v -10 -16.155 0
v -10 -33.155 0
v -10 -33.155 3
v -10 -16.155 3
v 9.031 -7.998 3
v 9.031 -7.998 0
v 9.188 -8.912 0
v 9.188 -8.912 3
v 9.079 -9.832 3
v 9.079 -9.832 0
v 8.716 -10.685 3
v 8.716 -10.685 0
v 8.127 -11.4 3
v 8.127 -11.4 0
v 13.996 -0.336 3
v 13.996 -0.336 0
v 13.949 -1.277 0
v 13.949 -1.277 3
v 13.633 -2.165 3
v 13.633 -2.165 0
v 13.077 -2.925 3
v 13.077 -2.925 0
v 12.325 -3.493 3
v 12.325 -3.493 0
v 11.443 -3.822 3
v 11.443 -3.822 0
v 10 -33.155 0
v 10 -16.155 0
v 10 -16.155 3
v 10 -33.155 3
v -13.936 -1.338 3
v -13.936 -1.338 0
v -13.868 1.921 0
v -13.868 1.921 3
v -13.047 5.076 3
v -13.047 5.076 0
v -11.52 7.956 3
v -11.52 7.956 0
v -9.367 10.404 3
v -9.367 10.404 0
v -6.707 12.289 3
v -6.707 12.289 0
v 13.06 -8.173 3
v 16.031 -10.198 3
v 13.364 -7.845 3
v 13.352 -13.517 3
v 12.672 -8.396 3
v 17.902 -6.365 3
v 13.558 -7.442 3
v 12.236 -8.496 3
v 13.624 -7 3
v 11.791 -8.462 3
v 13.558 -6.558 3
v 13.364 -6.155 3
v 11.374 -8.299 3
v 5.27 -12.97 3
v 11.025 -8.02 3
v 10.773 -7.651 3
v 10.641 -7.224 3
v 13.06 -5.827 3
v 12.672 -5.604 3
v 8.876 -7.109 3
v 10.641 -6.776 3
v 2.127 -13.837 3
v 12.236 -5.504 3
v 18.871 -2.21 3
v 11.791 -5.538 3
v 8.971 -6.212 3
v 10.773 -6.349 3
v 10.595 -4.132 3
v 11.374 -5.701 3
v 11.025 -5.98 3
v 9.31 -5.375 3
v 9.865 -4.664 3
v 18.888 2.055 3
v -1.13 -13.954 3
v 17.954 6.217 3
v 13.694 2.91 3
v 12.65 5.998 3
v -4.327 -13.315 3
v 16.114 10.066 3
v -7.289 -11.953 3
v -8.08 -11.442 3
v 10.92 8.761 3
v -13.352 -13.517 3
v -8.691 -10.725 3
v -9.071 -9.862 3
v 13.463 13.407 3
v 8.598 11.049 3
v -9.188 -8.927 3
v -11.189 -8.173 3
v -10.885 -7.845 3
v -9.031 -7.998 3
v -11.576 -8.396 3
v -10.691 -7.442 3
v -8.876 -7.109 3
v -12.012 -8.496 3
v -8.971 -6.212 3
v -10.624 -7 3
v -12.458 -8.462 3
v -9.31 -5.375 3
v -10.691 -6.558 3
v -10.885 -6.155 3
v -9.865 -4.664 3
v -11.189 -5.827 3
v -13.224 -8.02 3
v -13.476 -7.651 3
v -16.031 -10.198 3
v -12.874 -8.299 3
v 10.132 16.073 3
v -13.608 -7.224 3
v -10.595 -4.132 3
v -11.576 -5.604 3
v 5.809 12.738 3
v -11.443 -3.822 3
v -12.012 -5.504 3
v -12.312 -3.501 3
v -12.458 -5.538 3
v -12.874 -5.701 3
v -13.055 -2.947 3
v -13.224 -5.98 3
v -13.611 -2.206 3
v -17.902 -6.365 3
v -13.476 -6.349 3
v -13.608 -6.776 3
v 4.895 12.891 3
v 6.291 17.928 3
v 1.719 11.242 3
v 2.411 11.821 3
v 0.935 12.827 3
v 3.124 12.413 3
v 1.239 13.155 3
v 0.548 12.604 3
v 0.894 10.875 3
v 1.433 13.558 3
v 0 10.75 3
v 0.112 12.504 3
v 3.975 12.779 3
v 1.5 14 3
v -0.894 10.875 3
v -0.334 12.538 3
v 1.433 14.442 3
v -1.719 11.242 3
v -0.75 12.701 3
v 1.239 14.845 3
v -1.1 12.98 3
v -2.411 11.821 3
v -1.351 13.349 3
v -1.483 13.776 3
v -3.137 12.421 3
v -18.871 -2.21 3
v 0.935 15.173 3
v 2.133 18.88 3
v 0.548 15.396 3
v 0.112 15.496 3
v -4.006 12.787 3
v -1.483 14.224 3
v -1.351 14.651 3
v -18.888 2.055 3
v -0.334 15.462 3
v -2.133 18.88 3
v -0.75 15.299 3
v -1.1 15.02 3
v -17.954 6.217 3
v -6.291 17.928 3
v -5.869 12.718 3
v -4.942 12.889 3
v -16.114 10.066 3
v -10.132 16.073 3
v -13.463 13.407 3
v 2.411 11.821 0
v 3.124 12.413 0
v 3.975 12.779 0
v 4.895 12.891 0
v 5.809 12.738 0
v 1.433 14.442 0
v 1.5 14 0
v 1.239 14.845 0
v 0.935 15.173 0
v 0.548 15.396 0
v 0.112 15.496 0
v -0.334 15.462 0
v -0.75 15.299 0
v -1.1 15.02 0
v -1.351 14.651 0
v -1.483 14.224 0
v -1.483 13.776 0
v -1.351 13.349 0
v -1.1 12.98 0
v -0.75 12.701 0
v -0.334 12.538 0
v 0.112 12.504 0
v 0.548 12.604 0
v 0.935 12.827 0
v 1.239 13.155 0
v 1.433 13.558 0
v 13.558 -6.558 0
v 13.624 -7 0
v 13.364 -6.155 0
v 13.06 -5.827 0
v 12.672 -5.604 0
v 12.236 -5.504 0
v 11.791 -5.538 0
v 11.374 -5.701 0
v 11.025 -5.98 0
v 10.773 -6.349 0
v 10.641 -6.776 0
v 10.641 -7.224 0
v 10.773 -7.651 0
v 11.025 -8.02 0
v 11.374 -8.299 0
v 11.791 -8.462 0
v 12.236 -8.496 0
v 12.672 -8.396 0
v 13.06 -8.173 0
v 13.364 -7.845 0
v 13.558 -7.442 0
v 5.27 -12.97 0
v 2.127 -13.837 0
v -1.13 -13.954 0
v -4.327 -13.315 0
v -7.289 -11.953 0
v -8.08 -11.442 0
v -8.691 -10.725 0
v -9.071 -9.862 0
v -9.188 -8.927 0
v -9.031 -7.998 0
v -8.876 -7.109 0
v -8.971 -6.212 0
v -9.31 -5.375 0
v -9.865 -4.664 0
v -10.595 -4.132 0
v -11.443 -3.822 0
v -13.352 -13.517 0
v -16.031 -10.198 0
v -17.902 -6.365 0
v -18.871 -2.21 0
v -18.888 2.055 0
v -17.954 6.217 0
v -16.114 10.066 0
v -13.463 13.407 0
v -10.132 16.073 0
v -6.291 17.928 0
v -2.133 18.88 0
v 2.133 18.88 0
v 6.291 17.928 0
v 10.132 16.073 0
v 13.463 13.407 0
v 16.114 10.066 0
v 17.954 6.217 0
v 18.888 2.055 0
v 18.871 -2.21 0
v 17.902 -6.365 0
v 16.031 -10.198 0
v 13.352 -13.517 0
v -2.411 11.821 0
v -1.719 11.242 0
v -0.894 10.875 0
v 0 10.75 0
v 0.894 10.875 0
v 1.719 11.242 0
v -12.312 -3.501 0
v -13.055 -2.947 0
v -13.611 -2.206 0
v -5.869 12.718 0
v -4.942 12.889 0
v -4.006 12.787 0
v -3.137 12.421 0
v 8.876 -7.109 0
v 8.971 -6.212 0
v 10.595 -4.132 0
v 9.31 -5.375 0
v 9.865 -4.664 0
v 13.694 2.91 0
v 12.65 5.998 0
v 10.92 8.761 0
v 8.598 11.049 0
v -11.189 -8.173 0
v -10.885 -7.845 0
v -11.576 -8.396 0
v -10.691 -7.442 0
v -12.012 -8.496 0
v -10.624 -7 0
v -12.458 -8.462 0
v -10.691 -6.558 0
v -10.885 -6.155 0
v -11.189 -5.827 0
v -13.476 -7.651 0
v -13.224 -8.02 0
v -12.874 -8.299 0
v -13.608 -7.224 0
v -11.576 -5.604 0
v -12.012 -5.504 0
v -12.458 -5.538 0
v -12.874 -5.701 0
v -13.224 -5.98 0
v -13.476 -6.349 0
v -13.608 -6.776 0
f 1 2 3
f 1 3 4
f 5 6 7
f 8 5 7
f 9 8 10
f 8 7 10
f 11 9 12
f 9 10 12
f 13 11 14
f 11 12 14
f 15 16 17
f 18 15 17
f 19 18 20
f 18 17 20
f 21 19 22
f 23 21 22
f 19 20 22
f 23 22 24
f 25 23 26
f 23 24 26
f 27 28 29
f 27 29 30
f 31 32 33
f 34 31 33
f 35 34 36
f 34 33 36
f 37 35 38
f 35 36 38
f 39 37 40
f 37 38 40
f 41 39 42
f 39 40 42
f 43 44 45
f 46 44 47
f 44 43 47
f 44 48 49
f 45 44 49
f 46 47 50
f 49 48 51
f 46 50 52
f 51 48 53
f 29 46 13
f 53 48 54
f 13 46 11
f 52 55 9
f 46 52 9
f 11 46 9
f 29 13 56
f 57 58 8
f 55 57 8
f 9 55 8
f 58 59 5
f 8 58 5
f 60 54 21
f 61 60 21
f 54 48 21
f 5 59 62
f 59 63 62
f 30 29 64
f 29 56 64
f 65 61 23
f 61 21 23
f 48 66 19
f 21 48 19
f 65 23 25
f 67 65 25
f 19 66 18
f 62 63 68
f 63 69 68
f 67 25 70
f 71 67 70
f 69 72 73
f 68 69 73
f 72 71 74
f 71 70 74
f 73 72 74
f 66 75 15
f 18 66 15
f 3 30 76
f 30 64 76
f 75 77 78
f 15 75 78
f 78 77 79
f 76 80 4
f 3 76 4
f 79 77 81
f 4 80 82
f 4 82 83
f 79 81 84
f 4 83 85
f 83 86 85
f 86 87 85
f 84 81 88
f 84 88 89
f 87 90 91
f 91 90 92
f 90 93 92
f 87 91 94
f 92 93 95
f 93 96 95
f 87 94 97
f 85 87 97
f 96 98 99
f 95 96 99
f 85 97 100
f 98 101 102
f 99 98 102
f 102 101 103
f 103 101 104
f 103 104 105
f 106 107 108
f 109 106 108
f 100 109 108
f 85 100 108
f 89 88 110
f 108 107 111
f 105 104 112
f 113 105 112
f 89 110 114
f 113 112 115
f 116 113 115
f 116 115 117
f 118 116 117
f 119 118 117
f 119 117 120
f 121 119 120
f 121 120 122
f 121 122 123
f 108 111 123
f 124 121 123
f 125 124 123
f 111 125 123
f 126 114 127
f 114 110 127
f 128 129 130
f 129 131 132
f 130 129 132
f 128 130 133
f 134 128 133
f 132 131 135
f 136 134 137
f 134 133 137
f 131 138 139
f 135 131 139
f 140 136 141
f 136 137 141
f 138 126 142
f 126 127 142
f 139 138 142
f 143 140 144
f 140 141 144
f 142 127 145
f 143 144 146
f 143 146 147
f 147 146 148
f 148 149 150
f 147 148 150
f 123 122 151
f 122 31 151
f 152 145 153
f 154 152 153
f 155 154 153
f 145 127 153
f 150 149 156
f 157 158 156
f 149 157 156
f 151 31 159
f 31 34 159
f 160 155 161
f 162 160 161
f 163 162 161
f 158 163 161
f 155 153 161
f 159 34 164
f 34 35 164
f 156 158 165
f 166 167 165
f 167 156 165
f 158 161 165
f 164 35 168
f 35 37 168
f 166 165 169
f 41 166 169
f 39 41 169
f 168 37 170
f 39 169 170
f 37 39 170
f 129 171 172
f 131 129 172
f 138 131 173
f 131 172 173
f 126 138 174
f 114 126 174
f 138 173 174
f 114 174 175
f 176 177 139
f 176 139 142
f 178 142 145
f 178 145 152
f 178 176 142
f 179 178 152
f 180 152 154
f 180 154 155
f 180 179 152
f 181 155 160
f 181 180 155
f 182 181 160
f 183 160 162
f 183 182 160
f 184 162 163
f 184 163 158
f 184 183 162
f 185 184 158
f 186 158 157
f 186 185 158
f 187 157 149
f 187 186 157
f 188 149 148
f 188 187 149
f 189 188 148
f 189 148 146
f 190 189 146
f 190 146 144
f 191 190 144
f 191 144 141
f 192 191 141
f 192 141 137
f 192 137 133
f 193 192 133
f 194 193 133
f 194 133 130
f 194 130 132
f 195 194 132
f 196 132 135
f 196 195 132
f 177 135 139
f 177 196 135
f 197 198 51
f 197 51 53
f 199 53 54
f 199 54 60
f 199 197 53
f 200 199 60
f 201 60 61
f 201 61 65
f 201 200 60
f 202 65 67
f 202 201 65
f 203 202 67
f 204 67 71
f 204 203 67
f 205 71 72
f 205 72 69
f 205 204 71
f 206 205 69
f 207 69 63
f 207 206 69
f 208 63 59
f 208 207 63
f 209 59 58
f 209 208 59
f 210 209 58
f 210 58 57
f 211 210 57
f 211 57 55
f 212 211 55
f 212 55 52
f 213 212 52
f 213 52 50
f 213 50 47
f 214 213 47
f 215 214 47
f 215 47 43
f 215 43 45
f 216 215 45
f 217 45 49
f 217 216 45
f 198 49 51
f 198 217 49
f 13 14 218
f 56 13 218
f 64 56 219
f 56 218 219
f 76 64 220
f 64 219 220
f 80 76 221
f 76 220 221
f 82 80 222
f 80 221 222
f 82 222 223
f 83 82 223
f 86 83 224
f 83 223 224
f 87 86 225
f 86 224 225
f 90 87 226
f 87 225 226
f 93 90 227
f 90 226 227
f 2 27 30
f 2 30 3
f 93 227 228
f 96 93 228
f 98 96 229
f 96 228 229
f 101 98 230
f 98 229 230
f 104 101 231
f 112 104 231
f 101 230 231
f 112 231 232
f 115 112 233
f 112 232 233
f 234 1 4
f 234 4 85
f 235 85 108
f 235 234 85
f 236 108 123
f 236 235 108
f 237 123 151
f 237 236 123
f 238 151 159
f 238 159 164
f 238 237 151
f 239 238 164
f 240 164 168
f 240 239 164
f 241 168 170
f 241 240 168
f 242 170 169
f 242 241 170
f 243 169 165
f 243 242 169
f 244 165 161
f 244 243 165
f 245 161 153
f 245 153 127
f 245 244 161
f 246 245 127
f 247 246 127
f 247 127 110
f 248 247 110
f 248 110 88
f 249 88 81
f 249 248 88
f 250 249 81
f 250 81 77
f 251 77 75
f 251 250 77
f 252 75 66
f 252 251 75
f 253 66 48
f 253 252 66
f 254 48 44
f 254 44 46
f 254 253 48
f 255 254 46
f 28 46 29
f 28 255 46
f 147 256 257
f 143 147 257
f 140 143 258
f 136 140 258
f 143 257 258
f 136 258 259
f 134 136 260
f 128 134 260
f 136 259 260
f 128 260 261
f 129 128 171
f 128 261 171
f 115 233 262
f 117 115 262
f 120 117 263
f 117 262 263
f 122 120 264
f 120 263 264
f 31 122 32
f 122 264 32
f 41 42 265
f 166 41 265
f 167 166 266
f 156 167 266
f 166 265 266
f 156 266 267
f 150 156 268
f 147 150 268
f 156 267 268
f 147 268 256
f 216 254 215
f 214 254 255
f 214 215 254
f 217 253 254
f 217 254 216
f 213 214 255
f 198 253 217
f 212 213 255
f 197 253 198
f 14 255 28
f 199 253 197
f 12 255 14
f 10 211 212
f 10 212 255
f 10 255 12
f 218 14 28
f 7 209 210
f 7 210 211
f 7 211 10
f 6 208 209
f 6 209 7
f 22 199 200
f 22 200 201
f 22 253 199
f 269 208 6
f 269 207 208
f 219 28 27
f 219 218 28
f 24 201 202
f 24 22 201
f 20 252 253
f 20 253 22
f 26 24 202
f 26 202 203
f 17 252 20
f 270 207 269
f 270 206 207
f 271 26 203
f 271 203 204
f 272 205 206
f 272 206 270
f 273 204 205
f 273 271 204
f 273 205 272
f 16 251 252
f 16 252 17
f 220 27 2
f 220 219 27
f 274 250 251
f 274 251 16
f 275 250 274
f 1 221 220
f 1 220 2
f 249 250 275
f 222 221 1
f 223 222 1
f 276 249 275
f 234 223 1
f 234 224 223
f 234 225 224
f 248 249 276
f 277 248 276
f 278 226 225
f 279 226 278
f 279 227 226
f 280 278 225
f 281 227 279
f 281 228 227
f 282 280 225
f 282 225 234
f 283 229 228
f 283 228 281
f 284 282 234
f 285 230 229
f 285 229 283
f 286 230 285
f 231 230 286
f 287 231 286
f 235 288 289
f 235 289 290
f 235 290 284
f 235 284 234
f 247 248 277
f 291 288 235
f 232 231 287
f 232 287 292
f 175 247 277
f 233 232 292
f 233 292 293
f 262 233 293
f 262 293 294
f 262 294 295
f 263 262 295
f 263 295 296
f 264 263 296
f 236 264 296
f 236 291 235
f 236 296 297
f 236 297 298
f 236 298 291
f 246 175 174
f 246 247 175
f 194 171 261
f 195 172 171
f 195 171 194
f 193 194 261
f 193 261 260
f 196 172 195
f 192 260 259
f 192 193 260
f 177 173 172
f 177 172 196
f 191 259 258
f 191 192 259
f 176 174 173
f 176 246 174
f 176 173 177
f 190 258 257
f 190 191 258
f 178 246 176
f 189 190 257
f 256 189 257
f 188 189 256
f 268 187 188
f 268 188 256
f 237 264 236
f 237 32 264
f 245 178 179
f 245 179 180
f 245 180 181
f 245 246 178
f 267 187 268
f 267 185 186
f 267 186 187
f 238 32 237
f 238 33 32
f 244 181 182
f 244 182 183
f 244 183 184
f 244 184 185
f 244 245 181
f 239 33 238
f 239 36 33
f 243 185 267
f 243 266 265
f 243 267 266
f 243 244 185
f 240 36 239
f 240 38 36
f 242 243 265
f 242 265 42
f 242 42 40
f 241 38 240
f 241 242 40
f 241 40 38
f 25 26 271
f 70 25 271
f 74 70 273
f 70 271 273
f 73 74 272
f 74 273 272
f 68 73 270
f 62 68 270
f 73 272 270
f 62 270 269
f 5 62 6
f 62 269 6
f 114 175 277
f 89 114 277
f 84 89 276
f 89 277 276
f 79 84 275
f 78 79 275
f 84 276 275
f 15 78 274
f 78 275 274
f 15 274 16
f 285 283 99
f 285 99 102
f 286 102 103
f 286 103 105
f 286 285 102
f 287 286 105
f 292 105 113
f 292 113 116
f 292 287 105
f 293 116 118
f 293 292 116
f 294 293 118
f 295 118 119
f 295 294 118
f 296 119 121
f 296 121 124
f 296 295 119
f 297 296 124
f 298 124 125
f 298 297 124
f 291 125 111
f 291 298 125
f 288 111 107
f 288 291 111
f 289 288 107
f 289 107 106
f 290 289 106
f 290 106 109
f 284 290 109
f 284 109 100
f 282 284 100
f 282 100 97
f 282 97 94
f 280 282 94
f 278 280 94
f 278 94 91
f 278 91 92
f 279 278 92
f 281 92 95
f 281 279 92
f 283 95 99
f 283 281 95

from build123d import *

# Parameters (mm, degrees)
ESQUISSE1_R        = 1.5
BOSS_EXTRU_2_DEPTH = 3


with BuildPart() as part:
    # Esquisse1 → Boss.-Extru.2 (new body)
    with BuildSketch(Plane.XY):
        with BuildLine():
            Line((10, -16.155494421), (10, -33.155494421))
            Line((10, -33.155494421), (-10, -33.155494421))
            Line((-10, -33.155494421), (-10, -16.155494421))
            ThreePointArc((-10, -16.155494421), (0, 19), (10, -16.155494421))
        make_face()
        with Locations((0, 14)):
            Circle(ESQUISSE1_R, mode=Mode.SUBTRACT)
        with Locations((12.124355653, -7)):
            Circle(ESQUISSE1_R, mode=Mode.SUBTRACT)
        with Locations((-12.124355653, -7)):
            Circle(ESQUISSE1_R, mode=Mode.SUBTRACT)
        with BuildLine():
            ThreePointArc((-2.411034891, 11.820685714), (0, 10.75), (2.411034891, 11.820685714))
            ThreePointArc((2.411034891, 11.820685714), (3.975330286, 12.779130538), (5.80943088, 12.737759334))
            ThreePointArc((5.80943088, 12.737759334), (11.865562564, 7.430237213), (13.995977593, -0.335575935))
            ThreePointArc((13.995977593, -0.335575935), (13.382779595, -2.564868949), (11.442531564, -3.822325392))
            ThreePointArc((11.442531564, -3.822325392), (9.309773091, -5.375), (9.031496673, -7.998360322))
            ThreePointArc((9.031496673, -7.998360322), (9.079386541, -9.832302285), (8.126507731, -11.399994391))
            ThreePointArc((8.126507731, -11.399994391), (0.5019929, -13.990997217), (-7.288606081, -11.953084179))
            ThreePointArc((-7.288606081, -11.953084179), (-8.912631465, -10.307392628), (-9.031496673, -7.998360322))
            ThreePointArc((-9.031496673, -7.998360322), (-9.309773091, -5.375), (-11.442531564, -3.822325392))
            ThreePointArc((-11.442531564, -3.822325392), (-13.054716827, -2.946828253), (-13.935938611, -1.337764944))
            ThreePointArc((-13.935938611, -1.337764944), (-12.367555464, 6.560760004), (-6.707371512, 12.288660114))
            ThreePointArc((-6.707371512, 12.288660114), (-4.47014813, 12.872261577), (-2.411034891, 11.820685714))
        make_face(mode=Mode.SUBTRACT)
    extrude(amount=BOSS_EXTRU_2_DEPTH)


solid = part.part
